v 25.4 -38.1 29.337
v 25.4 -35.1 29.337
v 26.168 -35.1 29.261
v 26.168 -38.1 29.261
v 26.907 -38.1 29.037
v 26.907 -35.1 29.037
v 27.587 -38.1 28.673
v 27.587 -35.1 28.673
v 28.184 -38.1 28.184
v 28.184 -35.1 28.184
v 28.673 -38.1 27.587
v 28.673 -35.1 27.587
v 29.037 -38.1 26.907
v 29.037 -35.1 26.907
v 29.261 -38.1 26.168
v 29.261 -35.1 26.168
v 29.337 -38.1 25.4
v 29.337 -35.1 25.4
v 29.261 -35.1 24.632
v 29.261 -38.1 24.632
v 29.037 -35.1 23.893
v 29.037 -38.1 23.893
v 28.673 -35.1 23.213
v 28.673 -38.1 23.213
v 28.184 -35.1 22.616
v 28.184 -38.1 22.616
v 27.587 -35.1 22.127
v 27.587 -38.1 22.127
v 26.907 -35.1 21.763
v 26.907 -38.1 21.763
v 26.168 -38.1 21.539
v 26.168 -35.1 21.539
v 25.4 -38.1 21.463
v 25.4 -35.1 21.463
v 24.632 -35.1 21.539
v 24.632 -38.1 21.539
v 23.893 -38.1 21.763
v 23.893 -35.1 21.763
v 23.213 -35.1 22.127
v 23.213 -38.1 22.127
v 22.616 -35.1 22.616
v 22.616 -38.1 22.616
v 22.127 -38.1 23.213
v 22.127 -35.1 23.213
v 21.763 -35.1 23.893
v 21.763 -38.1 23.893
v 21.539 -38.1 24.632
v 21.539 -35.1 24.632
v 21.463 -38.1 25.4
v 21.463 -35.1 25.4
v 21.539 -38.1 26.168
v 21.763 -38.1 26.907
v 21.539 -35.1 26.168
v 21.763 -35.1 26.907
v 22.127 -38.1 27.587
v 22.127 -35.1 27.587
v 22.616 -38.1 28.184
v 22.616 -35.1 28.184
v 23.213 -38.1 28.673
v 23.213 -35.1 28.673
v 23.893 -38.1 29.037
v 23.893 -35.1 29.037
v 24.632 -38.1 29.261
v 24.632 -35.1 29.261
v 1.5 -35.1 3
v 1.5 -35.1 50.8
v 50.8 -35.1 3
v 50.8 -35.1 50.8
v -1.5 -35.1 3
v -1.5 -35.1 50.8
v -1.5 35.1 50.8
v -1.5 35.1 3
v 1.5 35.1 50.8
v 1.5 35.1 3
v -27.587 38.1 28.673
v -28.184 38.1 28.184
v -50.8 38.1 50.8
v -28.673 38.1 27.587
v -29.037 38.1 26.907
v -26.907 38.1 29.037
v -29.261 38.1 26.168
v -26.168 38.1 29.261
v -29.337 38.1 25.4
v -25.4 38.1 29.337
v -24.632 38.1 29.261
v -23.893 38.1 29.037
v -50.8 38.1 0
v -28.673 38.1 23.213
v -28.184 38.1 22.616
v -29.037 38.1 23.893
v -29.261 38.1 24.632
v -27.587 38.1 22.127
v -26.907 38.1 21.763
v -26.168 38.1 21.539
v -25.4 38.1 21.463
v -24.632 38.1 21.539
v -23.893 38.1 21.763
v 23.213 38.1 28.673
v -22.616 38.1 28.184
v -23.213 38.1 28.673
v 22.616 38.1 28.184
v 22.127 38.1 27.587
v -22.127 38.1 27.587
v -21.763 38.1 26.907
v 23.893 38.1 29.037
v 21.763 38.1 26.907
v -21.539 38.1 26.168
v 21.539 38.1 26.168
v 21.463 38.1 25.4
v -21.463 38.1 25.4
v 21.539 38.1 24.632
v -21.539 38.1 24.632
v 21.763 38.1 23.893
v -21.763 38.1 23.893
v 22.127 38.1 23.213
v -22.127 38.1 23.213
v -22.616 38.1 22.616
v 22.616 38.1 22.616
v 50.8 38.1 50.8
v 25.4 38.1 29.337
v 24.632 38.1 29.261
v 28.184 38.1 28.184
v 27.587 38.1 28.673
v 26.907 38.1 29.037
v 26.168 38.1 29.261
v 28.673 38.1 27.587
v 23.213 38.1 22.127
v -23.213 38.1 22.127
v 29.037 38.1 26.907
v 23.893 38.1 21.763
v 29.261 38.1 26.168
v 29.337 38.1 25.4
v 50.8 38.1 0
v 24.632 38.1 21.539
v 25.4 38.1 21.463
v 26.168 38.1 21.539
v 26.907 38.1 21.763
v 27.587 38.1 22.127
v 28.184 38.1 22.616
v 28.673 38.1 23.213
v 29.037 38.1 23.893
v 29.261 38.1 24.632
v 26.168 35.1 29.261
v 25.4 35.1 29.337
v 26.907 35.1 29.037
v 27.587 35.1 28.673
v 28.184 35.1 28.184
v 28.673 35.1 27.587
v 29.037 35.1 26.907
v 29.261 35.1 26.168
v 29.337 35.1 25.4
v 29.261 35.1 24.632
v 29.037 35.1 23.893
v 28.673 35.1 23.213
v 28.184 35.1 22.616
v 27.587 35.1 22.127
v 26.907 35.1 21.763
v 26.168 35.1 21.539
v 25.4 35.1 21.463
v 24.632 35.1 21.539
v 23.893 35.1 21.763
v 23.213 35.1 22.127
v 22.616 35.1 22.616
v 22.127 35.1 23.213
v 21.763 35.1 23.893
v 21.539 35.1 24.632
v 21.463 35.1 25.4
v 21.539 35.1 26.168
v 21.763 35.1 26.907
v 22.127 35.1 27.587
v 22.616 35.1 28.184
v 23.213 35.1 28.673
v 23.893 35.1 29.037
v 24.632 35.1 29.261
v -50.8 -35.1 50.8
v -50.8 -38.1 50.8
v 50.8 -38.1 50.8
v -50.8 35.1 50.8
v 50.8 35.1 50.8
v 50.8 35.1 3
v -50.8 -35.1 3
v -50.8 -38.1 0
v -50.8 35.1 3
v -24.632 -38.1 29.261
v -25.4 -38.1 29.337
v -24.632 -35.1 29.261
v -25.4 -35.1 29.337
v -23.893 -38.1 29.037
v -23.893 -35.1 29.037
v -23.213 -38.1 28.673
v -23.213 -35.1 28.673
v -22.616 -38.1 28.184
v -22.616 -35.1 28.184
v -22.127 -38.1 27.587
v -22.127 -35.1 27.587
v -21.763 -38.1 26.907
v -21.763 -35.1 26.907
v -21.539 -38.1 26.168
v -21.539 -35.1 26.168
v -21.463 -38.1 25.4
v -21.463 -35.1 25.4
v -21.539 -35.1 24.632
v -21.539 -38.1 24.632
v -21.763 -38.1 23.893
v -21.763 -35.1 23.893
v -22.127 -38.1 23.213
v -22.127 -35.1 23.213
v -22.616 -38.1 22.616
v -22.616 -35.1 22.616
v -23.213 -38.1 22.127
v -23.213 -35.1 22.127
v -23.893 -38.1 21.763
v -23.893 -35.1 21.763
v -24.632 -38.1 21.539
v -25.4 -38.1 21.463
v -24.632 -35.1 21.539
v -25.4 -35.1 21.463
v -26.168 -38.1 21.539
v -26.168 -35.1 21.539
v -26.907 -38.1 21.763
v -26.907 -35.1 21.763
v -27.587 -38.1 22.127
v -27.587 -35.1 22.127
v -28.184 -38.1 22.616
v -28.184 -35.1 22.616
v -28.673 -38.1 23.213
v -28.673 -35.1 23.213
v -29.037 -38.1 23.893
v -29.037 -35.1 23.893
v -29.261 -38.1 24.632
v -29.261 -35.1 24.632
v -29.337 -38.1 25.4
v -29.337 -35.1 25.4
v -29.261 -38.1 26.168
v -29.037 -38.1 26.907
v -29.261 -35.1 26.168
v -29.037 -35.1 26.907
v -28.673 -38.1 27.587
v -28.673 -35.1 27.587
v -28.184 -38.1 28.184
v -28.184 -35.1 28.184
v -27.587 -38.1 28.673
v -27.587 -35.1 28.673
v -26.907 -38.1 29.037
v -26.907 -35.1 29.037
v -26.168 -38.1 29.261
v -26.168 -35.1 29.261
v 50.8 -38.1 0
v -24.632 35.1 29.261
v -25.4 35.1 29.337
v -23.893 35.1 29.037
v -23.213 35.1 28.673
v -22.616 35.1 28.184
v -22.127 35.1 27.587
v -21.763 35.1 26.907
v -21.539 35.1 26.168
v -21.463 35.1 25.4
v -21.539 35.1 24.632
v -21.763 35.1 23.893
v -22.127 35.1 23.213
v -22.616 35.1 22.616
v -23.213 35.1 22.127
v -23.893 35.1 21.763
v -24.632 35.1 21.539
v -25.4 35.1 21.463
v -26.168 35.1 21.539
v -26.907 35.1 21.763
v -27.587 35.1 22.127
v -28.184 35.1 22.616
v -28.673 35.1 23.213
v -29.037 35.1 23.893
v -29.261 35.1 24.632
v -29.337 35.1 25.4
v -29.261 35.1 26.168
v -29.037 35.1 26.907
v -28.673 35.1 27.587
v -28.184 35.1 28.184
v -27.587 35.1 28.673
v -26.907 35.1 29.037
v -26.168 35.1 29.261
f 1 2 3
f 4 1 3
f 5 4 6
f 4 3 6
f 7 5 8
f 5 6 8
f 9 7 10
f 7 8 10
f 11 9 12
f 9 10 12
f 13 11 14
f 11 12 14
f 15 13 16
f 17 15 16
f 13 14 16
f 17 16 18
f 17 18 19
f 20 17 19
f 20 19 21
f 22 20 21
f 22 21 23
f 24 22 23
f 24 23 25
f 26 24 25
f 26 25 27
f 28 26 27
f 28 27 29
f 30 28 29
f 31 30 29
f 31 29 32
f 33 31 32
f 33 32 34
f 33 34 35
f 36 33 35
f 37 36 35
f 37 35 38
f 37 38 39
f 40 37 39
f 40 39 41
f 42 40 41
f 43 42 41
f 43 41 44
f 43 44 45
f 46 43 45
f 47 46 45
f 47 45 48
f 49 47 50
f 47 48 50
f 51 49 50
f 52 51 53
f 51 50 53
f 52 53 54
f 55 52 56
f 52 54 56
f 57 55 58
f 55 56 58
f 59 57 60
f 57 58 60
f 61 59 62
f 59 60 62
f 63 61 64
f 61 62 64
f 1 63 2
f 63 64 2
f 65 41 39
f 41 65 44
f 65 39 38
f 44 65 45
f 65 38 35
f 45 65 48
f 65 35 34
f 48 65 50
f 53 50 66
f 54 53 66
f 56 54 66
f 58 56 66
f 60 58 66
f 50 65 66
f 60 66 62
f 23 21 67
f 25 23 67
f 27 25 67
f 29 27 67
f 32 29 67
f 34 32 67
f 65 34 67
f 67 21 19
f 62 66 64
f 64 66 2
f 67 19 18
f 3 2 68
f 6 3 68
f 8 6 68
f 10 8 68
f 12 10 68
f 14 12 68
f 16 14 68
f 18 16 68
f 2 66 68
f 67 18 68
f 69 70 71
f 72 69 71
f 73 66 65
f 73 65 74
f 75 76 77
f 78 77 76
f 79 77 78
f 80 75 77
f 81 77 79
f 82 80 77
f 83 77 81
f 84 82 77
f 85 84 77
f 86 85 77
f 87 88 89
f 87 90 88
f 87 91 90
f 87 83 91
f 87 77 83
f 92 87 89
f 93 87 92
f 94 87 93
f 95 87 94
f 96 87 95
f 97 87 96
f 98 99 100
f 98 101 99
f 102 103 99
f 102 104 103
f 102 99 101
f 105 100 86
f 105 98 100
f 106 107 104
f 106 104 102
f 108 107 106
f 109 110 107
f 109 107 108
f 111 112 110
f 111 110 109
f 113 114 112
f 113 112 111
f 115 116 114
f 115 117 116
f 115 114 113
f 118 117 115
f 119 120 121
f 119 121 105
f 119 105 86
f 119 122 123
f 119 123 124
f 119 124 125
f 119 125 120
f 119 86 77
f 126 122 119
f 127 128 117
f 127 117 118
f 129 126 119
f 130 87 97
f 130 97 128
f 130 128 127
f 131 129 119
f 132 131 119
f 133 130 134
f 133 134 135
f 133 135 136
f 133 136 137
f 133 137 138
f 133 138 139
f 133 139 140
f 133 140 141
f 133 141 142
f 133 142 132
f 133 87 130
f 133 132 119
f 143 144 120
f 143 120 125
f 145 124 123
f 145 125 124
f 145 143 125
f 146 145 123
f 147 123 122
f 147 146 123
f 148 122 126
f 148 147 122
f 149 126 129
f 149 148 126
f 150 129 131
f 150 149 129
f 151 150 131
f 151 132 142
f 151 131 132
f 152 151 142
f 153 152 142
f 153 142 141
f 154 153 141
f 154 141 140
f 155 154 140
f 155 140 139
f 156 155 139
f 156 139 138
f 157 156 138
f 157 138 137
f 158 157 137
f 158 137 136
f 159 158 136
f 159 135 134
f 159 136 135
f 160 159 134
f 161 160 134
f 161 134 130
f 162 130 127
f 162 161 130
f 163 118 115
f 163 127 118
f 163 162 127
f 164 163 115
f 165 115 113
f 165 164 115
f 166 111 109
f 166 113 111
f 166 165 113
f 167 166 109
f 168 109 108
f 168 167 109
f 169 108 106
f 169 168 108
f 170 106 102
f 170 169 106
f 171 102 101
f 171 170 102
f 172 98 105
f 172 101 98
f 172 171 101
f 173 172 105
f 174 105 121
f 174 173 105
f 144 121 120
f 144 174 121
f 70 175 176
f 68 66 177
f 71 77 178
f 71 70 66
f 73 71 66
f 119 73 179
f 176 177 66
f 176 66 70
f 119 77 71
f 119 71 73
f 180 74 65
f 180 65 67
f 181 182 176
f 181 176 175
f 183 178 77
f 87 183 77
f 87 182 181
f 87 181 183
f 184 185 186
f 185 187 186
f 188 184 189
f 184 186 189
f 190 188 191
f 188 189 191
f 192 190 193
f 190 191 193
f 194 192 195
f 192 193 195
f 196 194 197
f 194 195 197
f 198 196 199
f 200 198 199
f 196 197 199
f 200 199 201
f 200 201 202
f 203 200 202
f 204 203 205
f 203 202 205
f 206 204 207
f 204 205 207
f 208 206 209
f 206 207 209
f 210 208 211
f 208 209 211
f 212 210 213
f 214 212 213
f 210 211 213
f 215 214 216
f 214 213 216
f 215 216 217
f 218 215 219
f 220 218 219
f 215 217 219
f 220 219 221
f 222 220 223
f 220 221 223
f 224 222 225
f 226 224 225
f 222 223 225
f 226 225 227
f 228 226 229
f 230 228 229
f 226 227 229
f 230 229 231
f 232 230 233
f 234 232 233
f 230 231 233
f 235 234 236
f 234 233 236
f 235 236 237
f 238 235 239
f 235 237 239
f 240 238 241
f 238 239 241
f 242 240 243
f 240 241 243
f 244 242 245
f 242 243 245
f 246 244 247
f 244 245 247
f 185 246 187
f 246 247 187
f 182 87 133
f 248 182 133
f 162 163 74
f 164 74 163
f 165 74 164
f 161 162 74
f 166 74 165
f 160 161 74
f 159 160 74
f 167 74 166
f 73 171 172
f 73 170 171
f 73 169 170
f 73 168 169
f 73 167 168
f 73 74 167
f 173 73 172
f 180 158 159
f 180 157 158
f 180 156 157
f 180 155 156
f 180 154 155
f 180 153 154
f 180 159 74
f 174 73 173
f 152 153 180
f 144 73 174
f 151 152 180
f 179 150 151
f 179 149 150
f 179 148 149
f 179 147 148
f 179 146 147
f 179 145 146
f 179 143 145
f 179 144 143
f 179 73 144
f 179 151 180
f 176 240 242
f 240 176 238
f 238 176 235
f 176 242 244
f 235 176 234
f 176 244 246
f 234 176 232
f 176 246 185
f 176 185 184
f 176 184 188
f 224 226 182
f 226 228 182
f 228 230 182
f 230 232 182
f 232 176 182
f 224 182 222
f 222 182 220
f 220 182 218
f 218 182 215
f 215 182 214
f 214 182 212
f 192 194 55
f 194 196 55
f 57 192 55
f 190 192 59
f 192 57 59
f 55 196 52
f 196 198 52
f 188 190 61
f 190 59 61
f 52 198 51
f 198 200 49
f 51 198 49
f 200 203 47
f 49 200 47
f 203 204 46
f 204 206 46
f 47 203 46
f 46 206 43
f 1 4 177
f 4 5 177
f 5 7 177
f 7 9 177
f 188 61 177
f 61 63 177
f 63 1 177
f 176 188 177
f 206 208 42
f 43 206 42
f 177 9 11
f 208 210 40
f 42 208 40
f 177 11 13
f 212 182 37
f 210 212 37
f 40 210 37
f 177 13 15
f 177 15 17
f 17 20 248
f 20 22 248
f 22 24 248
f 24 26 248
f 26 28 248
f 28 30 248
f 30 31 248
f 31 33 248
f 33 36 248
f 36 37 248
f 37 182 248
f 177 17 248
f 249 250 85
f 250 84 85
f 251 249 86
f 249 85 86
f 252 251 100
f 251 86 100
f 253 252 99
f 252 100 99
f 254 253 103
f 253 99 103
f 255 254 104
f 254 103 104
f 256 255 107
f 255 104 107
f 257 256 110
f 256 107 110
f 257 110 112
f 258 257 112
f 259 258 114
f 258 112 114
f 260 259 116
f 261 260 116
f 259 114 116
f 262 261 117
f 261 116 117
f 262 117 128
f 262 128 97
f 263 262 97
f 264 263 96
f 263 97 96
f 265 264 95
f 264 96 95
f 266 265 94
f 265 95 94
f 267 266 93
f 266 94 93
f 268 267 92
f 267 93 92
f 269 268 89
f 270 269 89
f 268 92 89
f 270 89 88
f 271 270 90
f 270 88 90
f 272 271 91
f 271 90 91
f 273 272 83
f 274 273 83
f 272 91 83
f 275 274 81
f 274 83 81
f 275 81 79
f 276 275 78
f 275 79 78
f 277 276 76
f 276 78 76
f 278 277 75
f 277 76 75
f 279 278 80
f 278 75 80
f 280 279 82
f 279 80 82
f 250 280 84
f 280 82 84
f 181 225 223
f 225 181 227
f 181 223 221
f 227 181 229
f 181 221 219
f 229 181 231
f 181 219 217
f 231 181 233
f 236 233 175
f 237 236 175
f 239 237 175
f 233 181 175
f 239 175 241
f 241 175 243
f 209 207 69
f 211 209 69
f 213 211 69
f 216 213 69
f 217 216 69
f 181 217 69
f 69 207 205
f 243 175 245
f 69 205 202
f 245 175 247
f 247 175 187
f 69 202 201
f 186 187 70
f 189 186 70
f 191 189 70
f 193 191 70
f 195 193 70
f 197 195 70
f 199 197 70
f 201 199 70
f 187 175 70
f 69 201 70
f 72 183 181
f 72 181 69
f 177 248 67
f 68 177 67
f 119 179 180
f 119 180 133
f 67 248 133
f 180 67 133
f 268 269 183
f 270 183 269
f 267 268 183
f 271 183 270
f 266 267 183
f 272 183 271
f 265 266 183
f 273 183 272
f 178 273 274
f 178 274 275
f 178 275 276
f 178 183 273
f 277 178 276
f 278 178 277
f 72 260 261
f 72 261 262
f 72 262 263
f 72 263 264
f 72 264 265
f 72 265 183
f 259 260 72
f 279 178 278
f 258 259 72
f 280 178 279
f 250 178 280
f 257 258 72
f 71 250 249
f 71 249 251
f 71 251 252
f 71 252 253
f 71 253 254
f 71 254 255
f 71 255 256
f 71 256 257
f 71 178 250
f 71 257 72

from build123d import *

# Parameters (mm, degrees)
SKETCH1_W           = 101.6
SKETCH1_H           = 76.2
BOSS_EXTRUDE1_DEPTH = 50.8
SKETCH3_W           = 49.3
SKETCH3_H           = 70.2
CUT_EXTRUDE1_DEPTH  = 47.8
SKETCH4_R           = 3.937
CUT_EXTRUDE3_DEPTH  = 50.8


with BuildPart() as part:
    # Sketch1 → Boss-Extrude1 (new body)
    with BuildSketch(Plane.XY):
        Rectangle(SKETCH1_W, SKETCH1_H)
    extrude(amount=BOSS_EXTRUDE1_DEPTH)

    # Sketch3 → Cut-Extrude1 (cut)
    with BuildSketch(Plane.XY.offset(50.8)):
        with Locations((-26.15, 0)):
            Rectangle(SKETCH3_W, SKETCH3_H)
        with Locations((26.15, 0)):
            Rectangle(SKETCH3_W, SKETCH3_H)
    extrude(amount=-CUT_EXTRUDE1_DEPTH, mode=Mode.SUBTRACT)

    # Sketch4 → Cut-Extrude3 (cut, symmetric)
    with BuildSketch(Plane(origin=(0, 0, 0), x_dir=(1, 0, 0), z_dir=(0, 1, 0))):
        with Locations(Location((25.4, -25.4, 0), (0, 0, 270))):
            Circle(SKETCH4_R)
        with Locations(Location((-25.4, -25.4, 0), (0, 0, 270))):
            Circle(SKETCH4_R)
    extrude(amount=CUT_EXTRUDE3_DEPTH, both=True, mode=Mode.SUBTRACT)


solid = part.part
